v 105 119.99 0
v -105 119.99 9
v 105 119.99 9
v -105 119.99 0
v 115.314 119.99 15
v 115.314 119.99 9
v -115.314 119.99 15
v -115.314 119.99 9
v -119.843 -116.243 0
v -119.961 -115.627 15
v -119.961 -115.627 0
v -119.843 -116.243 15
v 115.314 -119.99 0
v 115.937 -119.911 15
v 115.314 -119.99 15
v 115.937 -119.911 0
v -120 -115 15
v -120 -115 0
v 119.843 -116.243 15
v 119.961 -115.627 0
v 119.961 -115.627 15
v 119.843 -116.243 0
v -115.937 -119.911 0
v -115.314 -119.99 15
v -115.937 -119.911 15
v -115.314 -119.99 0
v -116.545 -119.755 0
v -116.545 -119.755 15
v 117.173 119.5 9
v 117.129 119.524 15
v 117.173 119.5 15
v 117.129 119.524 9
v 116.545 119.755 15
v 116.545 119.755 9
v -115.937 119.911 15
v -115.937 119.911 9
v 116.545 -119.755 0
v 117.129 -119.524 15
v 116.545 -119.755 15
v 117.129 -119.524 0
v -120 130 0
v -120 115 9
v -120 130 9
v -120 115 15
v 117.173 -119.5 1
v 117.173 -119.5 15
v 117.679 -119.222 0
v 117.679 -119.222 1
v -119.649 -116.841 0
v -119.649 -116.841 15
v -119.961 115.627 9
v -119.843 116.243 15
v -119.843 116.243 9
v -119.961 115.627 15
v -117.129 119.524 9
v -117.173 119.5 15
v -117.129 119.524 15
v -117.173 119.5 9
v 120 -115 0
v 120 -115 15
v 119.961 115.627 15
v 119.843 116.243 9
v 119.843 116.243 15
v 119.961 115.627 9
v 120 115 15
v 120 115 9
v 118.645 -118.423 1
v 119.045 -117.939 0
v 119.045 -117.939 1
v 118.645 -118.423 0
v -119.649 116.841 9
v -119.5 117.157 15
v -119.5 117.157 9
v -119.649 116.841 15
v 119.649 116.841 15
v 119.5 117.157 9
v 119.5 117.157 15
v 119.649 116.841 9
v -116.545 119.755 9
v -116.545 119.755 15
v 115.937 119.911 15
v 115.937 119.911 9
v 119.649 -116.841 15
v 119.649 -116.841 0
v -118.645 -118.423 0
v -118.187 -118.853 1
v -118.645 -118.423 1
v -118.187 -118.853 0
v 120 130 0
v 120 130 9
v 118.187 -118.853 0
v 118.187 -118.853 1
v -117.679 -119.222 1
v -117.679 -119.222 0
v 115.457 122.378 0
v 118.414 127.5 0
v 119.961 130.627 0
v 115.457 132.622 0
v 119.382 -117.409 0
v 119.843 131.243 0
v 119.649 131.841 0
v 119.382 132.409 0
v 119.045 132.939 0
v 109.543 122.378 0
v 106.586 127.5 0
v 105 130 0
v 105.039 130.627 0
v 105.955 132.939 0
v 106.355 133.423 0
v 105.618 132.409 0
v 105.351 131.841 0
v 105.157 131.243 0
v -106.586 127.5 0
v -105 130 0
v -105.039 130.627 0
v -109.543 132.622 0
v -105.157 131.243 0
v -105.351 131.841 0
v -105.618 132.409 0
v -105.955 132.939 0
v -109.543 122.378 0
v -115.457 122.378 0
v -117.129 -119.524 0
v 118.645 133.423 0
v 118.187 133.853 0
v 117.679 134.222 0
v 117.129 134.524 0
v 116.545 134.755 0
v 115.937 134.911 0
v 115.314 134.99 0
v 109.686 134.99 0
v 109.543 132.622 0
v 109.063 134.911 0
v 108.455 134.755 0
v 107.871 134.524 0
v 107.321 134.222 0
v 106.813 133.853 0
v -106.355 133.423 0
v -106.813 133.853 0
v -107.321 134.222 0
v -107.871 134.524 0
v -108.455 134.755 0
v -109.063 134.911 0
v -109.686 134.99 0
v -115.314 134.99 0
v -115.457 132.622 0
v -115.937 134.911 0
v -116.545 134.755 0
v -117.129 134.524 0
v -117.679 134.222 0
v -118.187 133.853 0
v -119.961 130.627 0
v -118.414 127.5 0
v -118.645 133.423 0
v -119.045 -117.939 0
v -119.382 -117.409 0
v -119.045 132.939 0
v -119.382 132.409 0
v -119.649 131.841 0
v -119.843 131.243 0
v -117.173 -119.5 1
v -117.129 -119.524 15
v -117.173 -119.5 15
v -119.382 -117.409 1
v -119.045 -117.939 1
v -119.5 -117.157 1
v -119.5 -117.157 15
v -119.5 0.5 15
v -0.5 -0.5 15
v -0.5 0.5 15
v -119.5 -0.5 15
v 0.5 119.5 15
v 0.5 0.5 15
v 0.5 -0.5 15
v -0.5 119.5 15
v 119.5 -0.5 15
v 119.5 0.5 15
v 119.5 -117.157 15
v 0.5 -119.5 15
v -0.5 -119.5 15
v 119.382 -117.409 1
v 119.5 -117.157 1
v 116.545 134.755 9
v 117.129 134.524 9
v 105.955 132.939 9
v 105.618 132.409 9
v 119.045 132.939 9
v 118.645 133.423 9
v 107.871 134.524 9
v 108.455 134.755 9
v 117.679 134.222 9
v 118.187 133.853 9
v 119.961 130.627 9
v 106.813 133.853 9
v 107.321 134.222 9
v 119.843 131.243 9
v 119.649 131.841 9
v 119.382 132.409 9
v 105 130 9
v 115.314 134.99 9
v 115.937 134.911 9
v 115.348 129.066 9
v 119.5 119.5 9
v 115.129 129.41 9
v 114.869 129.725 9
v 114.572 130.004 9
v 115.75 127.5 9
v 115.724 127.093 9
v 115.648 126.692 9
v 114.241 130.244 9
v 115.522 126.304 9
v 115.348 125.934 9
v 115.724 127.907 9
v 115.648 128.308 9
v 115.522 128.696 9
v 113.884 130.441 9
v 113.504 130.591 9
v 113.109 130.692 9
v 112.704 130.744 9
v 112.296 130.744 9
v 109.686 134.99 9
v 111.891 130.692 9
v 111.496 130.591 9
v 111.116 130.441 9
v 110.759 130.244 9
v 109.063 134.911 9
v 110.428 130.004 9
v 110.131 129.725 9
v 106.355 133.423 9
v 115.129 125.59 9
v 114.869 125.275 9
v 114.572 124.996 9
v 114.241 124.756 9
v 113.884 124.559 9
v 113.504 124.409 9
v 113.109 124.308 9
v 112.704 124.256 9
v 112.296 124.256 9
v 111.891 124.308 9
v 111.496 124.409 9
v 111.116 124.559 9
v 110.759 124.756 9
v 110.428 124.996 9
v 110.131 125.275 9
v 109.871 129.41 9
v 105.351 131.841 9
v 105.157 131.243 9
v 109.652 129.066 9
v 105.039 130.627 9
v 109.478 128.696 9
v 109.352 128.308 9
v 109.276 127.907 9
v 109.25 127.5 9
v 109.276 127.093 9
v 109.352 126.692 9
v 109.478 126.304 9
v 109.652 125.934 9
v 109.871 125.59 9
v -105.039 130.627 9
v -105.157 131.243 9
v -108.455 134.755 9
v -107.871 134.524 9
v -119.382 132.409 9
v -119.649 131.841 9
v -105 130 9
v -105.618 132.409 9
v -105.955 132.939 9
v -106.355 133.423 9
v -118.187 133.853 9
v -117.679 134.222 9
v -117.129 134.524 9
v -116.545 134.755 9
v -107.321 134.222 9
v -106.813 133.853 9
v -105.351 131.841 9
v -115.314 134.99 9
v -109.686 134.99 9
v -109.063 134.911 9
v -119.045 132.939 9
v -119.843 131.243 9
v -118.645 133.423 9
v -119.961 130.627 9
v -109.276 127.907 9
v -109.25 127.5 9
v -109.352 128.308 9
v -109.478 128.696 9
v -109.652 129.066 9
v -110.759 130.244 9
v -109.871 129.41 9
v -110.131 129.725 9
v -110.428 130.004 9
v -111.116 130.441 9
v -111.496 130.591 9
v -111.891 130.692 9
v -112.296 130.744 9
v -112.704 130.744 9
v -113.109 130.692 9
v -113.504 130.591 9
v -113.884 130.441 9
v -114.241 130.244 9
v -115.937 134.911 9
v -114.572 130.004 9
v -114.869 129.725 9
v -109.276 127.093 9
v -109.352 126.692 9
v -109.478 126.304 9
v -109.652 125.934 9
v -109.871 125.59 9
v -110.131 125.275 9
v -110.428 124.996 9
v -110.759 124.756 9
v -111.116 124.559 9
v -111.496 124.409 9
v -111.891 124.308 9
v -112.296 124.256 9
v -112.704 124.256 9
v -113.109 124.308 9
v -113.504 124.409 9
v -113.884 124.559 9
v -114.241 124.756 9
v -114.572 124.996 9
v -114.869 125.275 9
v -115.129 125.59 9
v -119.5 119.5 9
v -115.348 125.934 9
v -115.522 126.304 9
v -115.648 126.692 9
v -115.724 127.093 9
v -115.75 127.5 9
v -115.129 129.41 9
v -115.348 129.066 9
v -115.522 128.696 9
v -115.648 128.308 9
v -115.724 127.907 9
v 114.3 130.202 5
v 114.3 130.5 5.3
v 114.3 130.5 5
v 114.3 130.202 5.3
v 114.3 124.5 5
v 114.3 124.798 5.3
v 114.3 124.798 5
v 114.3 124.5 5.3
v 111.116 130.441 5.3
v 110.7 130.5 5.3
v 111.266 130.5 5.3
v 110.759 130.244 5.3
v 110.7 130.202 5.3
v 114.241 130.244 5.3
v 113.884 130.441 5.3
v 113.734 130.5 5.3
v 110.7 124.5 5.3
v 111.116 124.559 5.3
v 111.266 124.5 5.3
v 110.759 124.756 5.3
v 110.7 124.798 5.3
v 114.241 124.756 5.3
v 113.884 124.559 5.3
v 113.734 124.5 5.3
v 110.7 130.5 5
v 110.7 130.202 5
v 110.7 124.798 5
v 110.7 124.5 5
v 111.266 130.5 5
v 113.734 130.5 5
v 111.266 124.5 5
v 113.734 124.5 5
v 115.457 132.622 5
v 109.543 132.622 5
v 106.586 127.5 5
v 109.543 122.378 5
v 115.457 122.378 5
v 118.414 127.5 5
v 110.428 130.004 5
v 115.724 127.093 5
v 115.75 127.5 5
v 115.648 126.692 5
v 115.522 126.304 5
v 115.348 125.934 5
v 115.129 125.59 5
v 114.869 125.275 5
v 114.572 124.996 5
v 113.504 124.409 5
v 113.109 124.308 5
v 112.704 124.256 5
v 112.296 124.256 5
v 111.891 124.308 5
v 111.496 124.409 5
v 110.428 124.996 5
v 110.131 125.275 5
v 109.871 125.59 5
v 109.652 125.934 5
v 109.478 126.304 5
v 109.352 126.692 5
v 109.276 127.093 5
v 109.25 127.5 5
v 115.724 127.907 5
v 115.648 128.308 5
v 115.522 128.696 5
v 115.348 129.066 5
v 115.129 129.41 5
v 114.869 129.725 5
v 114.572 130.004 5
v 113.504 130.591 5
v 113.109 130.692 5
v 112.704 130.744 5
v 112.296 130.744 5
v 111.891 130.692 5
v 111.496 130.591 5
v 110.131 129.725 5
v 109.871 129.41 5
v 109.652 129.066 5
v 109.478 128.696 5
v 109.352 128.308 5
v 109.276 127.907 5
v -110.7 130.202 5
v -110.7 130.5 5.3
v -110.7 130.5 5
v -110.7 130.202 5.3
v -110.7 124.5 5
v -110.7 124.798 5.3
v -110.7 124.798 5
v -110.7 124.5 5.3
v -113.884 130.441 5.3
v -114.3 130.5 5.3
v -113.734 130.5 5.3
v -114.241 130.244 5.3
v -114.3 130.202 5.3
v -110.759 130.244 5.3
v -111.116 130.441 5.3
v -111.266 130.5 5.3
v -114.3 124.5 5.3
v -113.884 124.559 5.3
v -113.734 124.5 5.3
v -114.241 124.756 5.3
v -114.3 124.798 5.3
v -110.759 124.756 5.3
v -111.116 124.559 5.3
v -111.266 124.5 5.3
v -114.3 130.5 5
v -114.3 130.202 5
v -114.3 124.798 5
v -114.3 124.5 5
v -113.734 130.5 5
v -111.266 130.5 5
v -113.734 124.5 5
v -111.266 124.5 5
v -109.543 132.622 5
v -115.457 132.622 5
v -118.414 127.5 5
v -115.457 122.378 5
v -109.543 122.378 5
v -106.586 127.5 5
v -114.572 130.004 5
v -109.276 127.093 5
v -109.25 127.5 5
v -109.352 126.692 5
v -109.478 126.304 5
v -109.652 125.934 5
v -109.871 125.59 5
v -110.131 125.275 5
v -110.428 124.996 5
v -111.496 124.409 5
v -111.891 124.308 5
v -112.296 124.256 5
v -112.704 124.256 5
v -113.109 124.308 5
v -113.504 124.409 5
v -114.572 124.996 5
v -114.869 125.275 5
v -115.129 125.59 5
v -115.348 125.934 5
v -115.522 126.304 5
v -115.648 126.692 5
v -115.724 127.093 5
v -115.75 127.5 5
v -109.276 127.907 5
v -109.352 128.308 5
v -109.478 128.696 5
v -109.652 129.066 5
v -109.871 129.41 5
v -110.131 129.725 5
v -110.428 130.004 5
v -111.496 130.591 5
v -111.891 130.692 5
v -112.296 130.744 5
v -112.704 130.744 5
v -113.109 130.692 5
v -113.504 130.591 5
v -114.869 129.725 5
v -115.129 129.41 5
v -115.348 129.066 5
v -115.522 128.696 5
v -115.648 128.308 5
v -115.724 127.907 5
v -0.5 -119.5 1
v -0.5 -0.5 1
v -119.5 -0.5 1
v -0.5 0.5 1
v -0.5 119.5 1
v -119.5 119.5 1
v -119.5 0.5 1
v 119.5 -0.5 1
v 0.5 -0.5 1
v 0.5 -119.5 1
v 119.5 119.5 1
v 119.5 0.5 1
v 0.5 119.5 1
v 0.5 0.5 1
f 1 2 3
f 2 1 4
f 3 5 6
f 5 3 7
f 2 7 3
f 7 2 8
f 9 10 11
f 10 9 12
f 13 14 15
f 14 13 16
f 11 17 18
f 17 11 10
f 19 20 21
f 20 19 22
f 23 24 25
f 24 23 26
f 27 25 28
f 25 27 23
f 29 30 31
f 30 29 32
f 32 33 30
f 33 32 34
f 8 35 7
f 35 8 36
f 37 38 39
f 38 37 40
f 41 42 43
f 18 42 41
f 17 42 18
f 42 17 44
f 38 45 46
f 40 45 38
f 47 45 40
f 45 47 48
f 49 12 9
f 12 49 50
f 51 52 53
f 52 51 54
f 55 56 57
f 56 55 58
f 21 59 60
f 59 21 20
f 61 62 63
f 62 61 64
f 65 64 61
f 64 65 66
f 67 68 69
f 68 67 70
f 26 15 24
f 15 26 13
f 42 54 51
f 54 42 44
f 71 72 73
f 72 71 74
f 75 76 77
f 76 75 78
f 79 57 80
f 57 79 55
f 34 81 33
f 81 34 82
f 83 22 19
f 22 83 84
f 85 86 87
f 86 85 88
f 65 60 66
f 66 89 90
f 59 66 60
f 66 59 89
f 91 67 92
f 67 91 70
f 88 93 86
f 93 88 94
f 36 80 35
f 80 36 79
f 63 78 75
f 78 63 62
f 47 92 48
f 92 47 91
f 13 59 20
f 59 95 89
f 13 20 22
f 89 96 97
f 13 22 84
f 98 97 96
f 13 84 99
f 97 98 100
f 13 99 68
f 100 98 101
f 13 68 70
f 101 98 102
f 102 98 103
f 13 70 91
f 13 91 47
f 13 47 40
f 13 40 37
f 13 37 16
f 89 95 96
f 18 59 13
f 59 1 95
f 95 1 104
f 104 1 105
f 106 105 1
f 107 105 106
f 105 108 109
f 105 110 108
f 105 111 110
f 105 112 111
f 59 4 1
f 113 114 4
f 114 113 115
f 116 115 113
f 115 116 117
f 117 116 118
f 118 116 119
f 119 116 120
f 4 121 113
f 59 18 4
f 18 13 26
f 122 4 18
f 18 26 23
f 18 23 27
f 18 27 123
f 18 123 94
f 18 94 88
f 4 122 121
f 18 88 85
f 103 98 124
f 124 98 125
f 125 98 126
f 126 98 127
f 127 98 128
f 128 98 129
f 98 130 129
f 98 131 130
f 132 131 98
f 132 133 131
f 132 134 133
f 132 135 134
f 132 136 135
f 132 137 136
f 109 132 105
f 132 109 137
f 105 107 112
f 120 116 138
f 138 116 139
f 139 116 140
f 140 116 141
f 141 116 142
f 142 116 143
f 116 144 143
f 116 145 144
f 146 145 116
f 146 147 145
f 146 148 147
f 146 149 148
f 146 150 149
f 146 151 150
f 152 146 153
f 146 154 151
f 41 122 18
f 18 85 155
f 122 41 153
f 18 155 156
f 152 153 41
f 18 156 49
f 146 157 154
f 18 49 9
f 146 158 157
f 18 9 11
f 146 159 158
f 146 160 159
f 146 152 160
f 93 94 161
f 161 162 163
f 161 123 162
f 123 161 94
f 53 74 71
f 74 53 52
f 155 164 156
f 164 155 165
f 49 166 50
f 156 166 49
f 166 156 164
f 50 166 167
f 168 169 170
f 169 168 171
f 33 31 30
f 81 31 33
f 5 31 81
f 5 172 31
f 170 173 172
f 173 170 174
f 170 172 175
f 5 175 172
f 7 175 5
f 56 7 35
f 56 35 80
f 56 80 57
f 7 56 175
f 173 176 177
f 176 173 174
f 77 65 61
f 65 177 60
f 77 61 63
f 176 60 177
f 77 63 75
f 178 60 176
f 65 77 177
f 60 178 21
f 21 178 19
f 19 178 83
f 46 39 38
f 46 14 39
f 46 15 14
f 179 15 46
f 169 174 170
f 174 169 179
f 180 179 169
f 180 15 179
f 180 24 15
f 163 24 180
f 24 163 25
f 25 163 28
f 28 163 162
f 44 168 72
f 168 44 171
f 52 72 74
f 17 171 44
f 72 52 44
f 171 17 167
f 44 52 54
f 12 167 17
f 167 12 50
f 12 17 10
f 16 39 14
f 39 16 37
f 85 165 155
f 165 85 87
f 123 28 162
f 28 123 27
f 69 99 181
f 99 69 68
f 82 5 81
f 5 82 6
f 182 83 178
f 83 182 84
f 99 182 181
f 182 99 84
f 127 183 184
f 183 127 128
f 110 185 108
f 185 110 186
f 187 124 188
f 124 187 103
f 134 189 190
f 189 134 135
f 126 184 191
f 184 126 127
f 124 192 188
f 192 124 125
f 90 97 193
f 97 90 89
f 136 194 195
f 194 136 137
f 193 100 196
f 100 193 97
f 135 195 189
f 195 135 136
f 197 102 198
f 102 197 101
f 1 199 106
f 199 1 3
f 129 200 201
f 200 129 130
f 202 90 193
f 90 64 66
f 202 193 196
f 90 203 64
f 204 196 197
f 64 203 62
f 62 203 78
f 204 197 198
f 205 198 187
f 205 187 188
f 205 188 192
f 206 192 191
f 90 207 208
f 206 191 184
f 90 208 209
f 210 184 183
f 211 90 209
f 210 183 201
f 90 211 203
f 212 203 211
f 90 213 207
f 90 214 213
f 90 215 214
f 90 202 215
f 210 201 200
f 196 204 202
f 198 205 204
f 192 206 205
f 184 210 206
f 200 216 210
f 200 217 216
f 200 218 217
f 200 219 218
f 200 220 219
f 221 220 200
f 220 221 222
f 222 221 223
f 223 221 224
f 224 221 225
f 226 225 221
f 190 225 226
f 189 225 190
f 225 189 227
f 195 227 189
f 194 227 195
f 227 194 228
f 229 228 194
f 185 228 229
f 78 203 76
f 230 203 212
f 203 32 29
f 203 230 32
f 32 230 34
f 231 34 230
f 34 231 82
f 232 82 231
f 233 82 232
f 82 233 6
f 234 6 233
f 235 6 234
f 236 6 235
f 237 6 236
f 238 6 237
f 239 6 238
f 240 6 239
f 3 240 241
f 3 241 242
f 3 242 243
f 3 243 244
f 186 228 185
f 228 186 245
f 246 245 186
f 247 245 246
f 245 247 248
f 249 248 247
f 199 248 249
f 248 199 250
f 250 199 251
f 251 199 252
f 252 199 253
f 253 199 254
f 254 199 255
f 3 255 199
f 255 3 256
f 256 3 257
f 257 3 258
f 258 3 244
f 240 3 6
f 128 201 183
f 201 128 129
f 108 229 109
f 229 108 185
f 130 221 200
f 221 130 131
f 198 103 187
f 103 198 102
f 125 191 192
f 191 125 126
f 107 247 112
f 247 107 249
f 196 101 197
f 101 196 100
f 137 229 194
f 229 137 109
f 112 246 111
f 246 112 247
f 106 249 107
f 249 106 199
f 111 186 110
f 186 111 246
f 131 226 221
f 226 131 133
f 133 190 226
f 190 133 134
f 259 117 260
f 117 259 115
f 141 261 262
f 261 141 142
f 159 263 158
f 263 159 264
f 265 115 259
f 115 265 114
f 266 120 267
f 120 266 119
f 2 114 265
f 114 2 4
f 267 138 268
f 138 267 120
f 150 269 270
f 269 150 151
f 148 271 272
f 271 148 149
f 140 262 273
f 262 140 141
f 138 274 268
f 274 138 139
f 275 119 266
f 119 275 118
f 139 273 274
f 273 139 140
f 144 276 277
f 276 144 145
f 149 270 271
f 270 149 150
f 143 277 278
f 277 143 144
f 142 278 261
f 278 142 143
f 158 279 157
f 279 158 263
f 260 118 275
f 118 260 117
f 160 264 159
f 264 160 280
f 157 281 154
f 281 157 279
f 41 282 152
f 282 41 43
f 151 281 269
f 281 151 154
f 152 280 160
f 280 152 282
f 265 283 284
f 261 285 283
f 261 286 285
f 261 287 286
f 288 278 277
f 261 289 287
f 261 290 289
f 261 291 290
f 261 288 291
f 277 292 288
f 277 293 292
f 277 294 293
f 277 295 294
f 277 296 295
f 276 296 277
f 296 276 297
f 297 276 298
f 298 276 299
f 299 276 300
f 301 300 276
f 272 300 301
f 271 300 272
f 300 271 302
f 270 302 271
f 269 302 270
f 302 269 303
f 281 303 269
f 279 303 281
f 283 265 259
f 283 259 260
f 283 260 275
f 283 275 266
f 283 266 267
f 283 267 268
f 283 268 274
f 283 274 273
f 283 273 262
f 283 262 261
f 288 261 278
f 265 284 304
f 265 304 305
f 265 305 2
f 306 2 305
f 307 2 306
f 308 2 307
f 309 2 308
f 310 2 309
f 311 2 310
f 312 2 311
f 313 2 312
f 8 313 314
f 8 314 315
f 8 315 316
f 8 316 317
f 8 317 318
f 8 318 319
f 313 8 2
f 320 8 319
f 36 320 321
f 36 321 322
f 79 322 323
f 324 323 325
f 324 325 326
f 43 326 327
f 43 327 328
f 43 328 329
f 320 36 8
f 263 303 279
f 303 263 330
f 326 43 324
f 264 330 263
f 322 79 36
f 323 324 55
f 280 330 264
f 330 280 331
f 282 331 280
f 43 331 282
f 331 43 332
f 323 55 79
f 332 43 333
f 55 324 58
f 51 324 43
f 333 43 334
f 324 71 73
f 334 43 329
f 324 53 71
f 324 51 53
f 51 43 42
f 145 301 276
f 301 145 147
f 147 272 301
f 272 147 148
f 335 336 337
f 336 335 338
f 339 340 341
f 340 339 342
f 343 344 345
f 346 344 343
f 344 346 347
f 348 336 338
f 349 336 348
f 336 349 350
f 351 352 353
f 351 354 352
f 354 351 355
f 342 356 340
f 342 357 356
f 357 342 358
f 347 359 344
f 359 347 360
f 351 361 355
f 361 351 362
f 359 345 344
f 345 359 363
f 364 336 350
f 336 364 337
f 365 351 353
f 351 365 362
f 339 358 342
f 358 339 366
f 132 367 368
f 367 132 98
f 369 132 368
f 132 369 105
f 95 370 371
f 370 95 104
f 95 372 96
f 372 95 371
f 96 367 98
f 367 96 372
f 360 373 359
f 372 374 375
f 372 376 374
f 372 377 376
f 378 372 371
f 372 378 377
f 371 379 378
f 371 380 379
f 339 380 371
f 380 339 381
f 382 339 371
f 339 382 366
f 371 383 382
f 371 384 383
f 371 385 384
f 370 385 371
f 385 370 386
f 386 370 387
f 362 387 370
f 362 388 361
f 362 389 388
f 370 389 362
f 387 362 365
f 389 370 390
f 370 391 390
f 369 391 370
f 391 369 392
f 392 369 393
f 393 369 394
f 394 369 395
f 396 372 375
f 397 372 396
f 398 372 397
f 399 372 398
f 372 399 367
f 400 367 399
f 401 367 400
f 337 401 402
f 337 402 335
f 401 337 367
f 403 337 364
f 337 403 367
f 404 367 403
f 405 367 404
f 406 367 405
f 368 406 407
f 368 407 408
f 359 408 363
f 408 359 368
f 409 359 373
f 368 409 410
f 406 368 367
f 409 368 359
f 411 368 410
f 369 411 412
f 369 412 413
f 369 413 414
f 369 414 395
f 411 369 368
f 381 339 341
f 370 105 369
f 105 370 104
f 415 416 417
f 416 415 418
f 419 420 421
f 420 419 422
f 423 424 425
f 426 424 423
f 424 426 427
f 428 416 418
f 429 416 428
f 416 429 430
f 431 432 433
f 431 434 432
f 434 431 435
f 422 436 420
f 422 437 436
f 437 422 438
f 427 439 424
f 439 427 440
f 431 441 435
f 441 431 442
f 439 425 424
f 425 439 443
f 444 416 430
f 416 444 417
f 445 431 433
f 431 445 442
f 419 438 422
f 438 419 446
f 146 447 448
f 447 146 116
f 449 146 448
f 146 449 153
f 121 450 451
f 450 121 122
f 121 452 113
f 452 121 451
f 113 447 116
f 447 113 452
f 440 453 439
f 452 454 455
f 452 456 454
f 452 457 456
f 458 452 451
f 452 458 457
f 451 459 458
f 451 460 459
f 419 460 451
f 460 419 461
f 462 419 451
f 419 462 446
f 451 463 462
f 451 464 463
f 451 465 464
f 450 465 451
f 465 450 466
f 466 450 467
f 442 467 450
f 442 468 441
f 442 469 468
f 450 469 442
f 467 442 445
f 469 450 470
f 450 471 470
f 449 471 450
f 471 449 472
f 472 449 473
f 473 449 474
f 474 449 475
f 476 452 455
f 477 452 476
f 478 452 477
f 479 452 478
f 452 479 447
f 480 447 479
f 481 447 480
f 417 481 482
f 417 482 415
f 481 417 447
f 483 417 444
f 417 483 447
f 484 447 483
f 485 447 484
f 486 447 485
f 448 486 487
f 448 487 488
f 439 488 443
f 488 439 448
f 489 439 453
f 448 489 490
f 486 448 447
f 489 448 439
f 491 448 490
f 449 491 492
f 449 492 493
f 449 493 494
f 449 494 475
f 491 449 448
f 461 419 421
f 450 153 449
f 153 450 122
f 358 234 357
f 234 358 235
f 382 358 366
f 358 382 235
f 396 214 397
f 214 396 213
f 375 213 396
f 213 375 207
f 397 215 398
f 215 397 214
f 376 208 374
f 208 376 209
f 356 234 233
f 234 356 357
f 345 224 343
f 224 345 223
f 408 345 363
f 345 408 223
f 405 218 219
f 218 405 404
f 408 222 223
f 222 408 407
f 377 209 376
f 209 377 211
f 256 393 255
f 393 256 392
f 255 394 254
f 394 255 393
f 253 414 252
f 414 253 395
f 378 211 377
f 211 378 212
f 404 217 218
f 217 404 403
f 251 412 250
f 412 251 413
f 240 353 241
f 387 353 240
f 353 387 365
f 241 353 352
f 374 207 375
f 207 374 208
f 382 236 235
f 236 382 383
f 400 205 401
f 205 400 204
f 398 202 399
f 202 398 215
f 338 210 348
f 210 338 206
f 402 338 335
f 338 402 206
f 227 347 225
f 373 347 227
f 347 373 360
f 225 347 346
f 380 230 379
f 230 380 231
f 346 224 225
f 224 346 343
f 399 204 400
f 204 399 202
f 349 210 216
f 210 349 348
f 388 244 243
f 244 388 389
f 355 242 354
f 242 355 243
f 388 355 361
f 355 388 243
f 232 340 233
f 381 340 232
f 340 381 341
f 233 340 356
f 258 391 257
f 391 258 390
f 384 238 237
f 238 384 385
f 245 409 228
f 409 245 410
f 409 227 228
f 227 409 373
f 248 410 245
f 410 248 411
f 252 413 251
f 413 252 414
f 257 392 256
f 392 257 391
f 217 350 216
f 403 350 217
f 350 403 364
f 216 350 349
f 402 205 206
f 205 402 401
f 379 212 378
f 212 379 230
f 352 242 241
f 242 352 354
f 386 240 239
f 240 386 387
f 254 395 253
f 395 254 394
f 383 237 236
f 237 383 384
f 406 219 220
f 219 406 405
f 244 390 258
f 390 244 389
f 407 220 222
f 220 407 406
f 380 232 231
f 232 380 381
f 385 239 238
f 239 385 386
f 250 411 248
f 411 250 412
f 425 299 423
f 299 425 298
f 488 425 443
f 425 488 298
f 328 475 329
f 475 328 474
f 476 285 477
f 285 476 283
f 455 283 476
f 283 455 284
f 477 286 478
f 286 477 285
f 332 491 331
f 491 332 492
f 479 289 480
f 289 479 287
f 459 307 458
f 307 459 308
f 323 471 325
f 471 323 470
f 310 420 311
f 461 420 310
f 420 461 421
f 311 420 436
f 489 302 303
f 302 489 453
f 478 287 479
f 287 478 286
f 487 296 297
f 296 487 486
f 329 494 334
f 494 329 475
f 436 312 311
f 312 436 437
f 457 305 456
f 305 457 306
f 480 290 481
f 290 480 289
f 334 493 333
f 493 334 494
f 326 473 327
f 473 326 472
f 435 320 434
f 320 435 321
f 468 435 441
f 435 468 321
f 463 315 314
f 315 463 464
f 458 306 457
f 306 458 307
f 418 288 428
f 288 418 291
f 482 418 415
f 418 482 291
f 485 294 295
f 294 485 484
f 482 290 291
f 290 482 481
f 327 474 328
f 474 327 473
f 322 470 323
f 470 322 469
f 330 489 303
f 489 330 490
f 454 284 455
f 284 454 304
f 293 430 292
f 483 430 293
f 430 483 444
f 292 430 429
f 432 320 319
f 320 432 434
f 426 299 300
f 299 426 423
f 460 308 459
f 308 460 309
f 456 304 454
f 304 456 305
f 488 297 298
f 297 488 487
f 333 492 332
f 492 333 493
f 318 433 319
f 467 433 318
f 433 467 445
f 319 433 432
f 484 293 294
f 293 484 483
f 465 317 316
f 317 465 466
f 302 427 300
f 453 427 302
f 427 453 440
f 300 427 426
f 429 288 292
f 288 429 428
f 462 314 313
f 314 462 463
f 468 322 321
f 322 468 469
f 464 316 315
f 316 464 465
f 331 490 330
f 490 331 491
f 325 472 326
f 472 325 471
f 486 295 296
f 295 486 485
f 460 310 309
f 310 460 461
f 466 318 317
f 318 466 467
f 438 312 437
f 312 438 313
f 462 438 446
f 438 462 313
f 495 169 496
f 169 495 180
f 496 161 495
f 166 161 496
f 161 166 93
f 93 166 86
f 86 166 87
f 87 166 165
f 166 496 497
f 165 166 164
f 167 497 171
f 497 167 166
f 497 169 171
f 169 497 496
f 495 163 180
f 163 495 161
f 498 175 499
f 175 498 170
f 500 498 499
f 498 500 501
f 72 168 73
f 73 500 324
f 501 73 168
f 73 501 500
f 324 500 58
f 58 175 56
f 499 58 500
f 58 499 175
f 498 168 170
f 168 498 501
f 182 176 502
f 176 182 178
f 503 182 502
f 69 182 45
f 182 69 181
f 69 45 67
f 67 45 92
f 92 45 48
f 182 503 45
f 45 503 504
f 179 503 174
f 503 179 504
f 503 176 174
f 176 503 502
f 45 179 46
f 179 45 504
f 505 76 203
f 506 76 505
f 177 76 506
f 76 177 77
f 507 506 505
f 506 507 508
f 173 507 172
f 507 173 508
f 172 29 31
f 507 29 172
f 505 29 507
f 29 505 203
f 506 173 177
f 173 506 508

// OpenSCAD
$fn = 50;


difference() {
	union() {
		hull() {
			translate(v = [-115.0000000000, 115.0000000000, 0]) {
				cylinder(h = 15, r = 5);
			}
			translate(v = [115.0000000000, 115.0000000000, 0]) {
				cylinder(h = 15, r = 5);
			}
			translate(v = [-115.0000000000, -115.0000000000, 0]) {
				cylinder(h = 15, r = 5);
			}
			translate(v = [115.0000000000, -115.0000000000, 0]) {
				cylinder(h = 15, r = 5);
			}
		}
		translate(v = [112.5000000000, 7.5000000000, 0]) {
			hull() {
				translate(v = [-2.5000000000, 122.5000000000, 0]) {
					cylinder(h = 9, r = 5);
				}
				translate(v = [2.5000000000, 122.5000000000, 0]) {
					cylinder(h = 9, r = 5);
				}
				translate(v = [-2.5000000000, -122.5000000000, 0]) {
					cylinder(h = 9, r = 5);
				}
				translate(v = [2.5000000000, -122.5000000000, 0]) {
					cylinder(h = 9, r = 5);
				}
			}
		}
		translate(v = [-112.5000000000, 7.5000000000, 0]) {
			hull() {
				translate(v = [-2.5000000000, 122.5000000000, 0]) {
					cylinder(h = 9, r = 5);
				}
				translate(v = [2.5000000000, 122.5000000000, 0]) {
					cylinder(h = 9, r = 5);
				}
				translate(v = [-2.5000000000, -122.5000000000, 0]) {
					cylinder(h = 9, r = 5);
				}
				translate(v = [2.5000000000, -122.5000000000, 0]) {
					cylinder(h = 9, r = 5);
				}
			}
		}
	}
	union() {
		translate(v = [112.5000000000, 127.5000000000, 0]) {
			rotate(a = [0, 0, 0]) {
				difference() {
					union() {
						translate(v = [-1.8000000000, -3.0000000000, -0.3000000000]) {
							cube(size = [3.6000000000, 6.0000000000, 0.3000000000]);
						}
						translate(v = [-1.8000000000, -1.8000000000, -0.6000000000]) {
							cube(size = [3.6000000000, 3.6000000000, 0.3000000000]);
						}
						translate(v = [-1.8000000000, -3.0000000000, 5]) {
							cube(size = [3.6000000000, 6.0000000000, 0.3000000000]);
						}
						translate(v = [-1.8000000000, -1.8000000000, 5.3000000000]) {
							cube(size = [3.6000000000, 3.6000000000, 0.3000000000]);
						}
						linear_extrude(height = 5) {
							polygon(points = [[5.9142500000, 0.0000000000], [2.9571250000, 5.1218907443], [-2.9571250000, 5.1218907443], [-5.9142500000, 0.0000000000], [-2.9571250000, -5.1218907443], [2.9571250000, -5.1218907443]]);
						}
						translate(v = [-1.8000000000, -3.0000000000, -0.3000000000]) {
							cube(size = [3.6000000000, 6.0000000000, 0.3000000000]);
						}
						translate(v = [-1.8000000000, -1.8000000000, -0.6000000000]) {
							cube(size = [3.6000000000, 3.6000000000, 0.3000000000]);
						}
						translate(v = [-1.8000000000, -3.0000000000, 5]) {
							cube(size = [3.6000000000, 6.0000000000, 0.3000000000]);
						}
						translate(v = [-1.8000000000, -1.8000000000, 5.3000000000]) {
							cube(size = [3.6000000000, 3.6000000000, 0.3000000000]);
						}
						translate(v = [-1.8000000000, -3.0000000000, -0.3000000000]) {
							cube(size = [3.6000000000, 6.0000000000, 0.3000000000]);
						}
						translate(v = [-1.8000000000, -1.8000000000, -0.6000000000]) {
							cube(size = [3.6000000000, 3.6000000000, 0.3000000000]);
						}
						translate(v = [-1.8000000000, -3.0000000000, 5]) {
							cube(size = [3.6000000000, 6.0000000000, 0.3000000000]);
						}
						translate(v = [-1.8000000000, -1.8000000000, 5.3000000000]) {
							cube(size = [3.6000000000, 3.6000000000, 0.3000000000]);
						}
					}
					union();
				}
			}
		}
		translate(v = [-112.5000000000, 127.5000000000, 0]) {
			rotate(a = [0, 0, 0]) {
				difference() {
					union() {
						translate(v = [-1.8000000000, -3.0000000000, -0.3000000000]) {
							cube(size = [3.6000000000, 6.0000000000, 0.3000000000]);
						}
						translate(v = [-1.8000000000, -1.8000000000, -0.6000000000]) {
							cube(size = [3.6000000000, 3.6000000000, 0.3000000000]);
						}
						translate(v = [-1.8000000000, -3.0000000000, 5]) {
							cube(size = [3.6000000000, 6.0000000000, 0.3000000000]);
						}
						translate(v = [-1.8000000000, -1.8000000000, 5.3000000000]) {
							cube(size = [3.6000000000, 3.6000000000, 0.3000000000]);
						}
						linear_extrude(height = 5) {
							polygon(points = [[5.9142500000, 0.0000000000], [2.9571250000, 5.1218907443], [-2.9571250000, 5.1218907443], [-5.9142500000, 0.0000000000], [-2.9571250000, -5.1218907443], [2.9571250000, -5.1218907443]]);
						}
						translate(v = [-1.8000000000, -3.0000000000, -0.3000000000]) {
							cube(size = [3.6000000000, 6.0000000000, 0.3000000000]);
						}
						translate(v = [-1.8000000000, -1.8000000000, -0.6000000000]) {
							cube(size = [3.6000000000, 3.6000000000, 0.3000000000]);
						}
						translate(v = [-1.8000000000, -3.0000000000, 5]) {
							cube(size = [3.6000000000, 6.0000000000, 0.3000000000]);
						}
						translate(v = [-1.8000000000, -1.8000000000, 5.3000000000]) {
							cube(size = [3.6000000000, 3.6000000000, 0.3000000000]);
						}
						translate(v = [-1.8000000000, -3.0000000000, -0.3000000000]) {
							cube(size = [3.6000000000, 6.0000000000, 0.3000000000]);
						}
						translate(v = [-1.8000000000, -1.8000000000, -0.6000000000]) {
							cube(size = [3.6000000000, 3.6000000000, 0.3000000000]);
						}
						translate(v = [-1.8000000000, -3.0000000000, 5]) {
							cube(size = [3.6000000000, 6.0000000000, 0.3000000000]);
						}
						translate(v = [-1.8000000000, -1.8000000000, 5.3000000000]) {
							cube(size = [3.6000000000, 3.6000000000, 0.3000000000]);
						}
					}
					union();
				}
			}
		}
		translate(v = [112.5000000000, 127.5000000000, -100.0000000000]) {
			cylinder(h = 200, r = 3.2500000000);
		}
		translate(v = [-112.5000000000, 127.5000000000, -100.0000000000]) {
			cylinder(h = 200, r = 3.2500000000);
		}
		#translate(v = [-119.5000000000, -119.5000000000, 1]) {
			cube(size = [119, 119, 30]);
		}
		#translate(v = [-119.5000000000, 0.5000000000, 1]) {
			cube(size = [119, 119, 30]);
		}
		#translate(v = [0.5000000000, -119.5000000000, 1]) {
			cube(size = [119, 119, 30]);
		}
		#translate(v = [0.5000000000, 0.5000000000, 1]) {
			cube(size = [119, 119, 30]);
		}
	}
}
